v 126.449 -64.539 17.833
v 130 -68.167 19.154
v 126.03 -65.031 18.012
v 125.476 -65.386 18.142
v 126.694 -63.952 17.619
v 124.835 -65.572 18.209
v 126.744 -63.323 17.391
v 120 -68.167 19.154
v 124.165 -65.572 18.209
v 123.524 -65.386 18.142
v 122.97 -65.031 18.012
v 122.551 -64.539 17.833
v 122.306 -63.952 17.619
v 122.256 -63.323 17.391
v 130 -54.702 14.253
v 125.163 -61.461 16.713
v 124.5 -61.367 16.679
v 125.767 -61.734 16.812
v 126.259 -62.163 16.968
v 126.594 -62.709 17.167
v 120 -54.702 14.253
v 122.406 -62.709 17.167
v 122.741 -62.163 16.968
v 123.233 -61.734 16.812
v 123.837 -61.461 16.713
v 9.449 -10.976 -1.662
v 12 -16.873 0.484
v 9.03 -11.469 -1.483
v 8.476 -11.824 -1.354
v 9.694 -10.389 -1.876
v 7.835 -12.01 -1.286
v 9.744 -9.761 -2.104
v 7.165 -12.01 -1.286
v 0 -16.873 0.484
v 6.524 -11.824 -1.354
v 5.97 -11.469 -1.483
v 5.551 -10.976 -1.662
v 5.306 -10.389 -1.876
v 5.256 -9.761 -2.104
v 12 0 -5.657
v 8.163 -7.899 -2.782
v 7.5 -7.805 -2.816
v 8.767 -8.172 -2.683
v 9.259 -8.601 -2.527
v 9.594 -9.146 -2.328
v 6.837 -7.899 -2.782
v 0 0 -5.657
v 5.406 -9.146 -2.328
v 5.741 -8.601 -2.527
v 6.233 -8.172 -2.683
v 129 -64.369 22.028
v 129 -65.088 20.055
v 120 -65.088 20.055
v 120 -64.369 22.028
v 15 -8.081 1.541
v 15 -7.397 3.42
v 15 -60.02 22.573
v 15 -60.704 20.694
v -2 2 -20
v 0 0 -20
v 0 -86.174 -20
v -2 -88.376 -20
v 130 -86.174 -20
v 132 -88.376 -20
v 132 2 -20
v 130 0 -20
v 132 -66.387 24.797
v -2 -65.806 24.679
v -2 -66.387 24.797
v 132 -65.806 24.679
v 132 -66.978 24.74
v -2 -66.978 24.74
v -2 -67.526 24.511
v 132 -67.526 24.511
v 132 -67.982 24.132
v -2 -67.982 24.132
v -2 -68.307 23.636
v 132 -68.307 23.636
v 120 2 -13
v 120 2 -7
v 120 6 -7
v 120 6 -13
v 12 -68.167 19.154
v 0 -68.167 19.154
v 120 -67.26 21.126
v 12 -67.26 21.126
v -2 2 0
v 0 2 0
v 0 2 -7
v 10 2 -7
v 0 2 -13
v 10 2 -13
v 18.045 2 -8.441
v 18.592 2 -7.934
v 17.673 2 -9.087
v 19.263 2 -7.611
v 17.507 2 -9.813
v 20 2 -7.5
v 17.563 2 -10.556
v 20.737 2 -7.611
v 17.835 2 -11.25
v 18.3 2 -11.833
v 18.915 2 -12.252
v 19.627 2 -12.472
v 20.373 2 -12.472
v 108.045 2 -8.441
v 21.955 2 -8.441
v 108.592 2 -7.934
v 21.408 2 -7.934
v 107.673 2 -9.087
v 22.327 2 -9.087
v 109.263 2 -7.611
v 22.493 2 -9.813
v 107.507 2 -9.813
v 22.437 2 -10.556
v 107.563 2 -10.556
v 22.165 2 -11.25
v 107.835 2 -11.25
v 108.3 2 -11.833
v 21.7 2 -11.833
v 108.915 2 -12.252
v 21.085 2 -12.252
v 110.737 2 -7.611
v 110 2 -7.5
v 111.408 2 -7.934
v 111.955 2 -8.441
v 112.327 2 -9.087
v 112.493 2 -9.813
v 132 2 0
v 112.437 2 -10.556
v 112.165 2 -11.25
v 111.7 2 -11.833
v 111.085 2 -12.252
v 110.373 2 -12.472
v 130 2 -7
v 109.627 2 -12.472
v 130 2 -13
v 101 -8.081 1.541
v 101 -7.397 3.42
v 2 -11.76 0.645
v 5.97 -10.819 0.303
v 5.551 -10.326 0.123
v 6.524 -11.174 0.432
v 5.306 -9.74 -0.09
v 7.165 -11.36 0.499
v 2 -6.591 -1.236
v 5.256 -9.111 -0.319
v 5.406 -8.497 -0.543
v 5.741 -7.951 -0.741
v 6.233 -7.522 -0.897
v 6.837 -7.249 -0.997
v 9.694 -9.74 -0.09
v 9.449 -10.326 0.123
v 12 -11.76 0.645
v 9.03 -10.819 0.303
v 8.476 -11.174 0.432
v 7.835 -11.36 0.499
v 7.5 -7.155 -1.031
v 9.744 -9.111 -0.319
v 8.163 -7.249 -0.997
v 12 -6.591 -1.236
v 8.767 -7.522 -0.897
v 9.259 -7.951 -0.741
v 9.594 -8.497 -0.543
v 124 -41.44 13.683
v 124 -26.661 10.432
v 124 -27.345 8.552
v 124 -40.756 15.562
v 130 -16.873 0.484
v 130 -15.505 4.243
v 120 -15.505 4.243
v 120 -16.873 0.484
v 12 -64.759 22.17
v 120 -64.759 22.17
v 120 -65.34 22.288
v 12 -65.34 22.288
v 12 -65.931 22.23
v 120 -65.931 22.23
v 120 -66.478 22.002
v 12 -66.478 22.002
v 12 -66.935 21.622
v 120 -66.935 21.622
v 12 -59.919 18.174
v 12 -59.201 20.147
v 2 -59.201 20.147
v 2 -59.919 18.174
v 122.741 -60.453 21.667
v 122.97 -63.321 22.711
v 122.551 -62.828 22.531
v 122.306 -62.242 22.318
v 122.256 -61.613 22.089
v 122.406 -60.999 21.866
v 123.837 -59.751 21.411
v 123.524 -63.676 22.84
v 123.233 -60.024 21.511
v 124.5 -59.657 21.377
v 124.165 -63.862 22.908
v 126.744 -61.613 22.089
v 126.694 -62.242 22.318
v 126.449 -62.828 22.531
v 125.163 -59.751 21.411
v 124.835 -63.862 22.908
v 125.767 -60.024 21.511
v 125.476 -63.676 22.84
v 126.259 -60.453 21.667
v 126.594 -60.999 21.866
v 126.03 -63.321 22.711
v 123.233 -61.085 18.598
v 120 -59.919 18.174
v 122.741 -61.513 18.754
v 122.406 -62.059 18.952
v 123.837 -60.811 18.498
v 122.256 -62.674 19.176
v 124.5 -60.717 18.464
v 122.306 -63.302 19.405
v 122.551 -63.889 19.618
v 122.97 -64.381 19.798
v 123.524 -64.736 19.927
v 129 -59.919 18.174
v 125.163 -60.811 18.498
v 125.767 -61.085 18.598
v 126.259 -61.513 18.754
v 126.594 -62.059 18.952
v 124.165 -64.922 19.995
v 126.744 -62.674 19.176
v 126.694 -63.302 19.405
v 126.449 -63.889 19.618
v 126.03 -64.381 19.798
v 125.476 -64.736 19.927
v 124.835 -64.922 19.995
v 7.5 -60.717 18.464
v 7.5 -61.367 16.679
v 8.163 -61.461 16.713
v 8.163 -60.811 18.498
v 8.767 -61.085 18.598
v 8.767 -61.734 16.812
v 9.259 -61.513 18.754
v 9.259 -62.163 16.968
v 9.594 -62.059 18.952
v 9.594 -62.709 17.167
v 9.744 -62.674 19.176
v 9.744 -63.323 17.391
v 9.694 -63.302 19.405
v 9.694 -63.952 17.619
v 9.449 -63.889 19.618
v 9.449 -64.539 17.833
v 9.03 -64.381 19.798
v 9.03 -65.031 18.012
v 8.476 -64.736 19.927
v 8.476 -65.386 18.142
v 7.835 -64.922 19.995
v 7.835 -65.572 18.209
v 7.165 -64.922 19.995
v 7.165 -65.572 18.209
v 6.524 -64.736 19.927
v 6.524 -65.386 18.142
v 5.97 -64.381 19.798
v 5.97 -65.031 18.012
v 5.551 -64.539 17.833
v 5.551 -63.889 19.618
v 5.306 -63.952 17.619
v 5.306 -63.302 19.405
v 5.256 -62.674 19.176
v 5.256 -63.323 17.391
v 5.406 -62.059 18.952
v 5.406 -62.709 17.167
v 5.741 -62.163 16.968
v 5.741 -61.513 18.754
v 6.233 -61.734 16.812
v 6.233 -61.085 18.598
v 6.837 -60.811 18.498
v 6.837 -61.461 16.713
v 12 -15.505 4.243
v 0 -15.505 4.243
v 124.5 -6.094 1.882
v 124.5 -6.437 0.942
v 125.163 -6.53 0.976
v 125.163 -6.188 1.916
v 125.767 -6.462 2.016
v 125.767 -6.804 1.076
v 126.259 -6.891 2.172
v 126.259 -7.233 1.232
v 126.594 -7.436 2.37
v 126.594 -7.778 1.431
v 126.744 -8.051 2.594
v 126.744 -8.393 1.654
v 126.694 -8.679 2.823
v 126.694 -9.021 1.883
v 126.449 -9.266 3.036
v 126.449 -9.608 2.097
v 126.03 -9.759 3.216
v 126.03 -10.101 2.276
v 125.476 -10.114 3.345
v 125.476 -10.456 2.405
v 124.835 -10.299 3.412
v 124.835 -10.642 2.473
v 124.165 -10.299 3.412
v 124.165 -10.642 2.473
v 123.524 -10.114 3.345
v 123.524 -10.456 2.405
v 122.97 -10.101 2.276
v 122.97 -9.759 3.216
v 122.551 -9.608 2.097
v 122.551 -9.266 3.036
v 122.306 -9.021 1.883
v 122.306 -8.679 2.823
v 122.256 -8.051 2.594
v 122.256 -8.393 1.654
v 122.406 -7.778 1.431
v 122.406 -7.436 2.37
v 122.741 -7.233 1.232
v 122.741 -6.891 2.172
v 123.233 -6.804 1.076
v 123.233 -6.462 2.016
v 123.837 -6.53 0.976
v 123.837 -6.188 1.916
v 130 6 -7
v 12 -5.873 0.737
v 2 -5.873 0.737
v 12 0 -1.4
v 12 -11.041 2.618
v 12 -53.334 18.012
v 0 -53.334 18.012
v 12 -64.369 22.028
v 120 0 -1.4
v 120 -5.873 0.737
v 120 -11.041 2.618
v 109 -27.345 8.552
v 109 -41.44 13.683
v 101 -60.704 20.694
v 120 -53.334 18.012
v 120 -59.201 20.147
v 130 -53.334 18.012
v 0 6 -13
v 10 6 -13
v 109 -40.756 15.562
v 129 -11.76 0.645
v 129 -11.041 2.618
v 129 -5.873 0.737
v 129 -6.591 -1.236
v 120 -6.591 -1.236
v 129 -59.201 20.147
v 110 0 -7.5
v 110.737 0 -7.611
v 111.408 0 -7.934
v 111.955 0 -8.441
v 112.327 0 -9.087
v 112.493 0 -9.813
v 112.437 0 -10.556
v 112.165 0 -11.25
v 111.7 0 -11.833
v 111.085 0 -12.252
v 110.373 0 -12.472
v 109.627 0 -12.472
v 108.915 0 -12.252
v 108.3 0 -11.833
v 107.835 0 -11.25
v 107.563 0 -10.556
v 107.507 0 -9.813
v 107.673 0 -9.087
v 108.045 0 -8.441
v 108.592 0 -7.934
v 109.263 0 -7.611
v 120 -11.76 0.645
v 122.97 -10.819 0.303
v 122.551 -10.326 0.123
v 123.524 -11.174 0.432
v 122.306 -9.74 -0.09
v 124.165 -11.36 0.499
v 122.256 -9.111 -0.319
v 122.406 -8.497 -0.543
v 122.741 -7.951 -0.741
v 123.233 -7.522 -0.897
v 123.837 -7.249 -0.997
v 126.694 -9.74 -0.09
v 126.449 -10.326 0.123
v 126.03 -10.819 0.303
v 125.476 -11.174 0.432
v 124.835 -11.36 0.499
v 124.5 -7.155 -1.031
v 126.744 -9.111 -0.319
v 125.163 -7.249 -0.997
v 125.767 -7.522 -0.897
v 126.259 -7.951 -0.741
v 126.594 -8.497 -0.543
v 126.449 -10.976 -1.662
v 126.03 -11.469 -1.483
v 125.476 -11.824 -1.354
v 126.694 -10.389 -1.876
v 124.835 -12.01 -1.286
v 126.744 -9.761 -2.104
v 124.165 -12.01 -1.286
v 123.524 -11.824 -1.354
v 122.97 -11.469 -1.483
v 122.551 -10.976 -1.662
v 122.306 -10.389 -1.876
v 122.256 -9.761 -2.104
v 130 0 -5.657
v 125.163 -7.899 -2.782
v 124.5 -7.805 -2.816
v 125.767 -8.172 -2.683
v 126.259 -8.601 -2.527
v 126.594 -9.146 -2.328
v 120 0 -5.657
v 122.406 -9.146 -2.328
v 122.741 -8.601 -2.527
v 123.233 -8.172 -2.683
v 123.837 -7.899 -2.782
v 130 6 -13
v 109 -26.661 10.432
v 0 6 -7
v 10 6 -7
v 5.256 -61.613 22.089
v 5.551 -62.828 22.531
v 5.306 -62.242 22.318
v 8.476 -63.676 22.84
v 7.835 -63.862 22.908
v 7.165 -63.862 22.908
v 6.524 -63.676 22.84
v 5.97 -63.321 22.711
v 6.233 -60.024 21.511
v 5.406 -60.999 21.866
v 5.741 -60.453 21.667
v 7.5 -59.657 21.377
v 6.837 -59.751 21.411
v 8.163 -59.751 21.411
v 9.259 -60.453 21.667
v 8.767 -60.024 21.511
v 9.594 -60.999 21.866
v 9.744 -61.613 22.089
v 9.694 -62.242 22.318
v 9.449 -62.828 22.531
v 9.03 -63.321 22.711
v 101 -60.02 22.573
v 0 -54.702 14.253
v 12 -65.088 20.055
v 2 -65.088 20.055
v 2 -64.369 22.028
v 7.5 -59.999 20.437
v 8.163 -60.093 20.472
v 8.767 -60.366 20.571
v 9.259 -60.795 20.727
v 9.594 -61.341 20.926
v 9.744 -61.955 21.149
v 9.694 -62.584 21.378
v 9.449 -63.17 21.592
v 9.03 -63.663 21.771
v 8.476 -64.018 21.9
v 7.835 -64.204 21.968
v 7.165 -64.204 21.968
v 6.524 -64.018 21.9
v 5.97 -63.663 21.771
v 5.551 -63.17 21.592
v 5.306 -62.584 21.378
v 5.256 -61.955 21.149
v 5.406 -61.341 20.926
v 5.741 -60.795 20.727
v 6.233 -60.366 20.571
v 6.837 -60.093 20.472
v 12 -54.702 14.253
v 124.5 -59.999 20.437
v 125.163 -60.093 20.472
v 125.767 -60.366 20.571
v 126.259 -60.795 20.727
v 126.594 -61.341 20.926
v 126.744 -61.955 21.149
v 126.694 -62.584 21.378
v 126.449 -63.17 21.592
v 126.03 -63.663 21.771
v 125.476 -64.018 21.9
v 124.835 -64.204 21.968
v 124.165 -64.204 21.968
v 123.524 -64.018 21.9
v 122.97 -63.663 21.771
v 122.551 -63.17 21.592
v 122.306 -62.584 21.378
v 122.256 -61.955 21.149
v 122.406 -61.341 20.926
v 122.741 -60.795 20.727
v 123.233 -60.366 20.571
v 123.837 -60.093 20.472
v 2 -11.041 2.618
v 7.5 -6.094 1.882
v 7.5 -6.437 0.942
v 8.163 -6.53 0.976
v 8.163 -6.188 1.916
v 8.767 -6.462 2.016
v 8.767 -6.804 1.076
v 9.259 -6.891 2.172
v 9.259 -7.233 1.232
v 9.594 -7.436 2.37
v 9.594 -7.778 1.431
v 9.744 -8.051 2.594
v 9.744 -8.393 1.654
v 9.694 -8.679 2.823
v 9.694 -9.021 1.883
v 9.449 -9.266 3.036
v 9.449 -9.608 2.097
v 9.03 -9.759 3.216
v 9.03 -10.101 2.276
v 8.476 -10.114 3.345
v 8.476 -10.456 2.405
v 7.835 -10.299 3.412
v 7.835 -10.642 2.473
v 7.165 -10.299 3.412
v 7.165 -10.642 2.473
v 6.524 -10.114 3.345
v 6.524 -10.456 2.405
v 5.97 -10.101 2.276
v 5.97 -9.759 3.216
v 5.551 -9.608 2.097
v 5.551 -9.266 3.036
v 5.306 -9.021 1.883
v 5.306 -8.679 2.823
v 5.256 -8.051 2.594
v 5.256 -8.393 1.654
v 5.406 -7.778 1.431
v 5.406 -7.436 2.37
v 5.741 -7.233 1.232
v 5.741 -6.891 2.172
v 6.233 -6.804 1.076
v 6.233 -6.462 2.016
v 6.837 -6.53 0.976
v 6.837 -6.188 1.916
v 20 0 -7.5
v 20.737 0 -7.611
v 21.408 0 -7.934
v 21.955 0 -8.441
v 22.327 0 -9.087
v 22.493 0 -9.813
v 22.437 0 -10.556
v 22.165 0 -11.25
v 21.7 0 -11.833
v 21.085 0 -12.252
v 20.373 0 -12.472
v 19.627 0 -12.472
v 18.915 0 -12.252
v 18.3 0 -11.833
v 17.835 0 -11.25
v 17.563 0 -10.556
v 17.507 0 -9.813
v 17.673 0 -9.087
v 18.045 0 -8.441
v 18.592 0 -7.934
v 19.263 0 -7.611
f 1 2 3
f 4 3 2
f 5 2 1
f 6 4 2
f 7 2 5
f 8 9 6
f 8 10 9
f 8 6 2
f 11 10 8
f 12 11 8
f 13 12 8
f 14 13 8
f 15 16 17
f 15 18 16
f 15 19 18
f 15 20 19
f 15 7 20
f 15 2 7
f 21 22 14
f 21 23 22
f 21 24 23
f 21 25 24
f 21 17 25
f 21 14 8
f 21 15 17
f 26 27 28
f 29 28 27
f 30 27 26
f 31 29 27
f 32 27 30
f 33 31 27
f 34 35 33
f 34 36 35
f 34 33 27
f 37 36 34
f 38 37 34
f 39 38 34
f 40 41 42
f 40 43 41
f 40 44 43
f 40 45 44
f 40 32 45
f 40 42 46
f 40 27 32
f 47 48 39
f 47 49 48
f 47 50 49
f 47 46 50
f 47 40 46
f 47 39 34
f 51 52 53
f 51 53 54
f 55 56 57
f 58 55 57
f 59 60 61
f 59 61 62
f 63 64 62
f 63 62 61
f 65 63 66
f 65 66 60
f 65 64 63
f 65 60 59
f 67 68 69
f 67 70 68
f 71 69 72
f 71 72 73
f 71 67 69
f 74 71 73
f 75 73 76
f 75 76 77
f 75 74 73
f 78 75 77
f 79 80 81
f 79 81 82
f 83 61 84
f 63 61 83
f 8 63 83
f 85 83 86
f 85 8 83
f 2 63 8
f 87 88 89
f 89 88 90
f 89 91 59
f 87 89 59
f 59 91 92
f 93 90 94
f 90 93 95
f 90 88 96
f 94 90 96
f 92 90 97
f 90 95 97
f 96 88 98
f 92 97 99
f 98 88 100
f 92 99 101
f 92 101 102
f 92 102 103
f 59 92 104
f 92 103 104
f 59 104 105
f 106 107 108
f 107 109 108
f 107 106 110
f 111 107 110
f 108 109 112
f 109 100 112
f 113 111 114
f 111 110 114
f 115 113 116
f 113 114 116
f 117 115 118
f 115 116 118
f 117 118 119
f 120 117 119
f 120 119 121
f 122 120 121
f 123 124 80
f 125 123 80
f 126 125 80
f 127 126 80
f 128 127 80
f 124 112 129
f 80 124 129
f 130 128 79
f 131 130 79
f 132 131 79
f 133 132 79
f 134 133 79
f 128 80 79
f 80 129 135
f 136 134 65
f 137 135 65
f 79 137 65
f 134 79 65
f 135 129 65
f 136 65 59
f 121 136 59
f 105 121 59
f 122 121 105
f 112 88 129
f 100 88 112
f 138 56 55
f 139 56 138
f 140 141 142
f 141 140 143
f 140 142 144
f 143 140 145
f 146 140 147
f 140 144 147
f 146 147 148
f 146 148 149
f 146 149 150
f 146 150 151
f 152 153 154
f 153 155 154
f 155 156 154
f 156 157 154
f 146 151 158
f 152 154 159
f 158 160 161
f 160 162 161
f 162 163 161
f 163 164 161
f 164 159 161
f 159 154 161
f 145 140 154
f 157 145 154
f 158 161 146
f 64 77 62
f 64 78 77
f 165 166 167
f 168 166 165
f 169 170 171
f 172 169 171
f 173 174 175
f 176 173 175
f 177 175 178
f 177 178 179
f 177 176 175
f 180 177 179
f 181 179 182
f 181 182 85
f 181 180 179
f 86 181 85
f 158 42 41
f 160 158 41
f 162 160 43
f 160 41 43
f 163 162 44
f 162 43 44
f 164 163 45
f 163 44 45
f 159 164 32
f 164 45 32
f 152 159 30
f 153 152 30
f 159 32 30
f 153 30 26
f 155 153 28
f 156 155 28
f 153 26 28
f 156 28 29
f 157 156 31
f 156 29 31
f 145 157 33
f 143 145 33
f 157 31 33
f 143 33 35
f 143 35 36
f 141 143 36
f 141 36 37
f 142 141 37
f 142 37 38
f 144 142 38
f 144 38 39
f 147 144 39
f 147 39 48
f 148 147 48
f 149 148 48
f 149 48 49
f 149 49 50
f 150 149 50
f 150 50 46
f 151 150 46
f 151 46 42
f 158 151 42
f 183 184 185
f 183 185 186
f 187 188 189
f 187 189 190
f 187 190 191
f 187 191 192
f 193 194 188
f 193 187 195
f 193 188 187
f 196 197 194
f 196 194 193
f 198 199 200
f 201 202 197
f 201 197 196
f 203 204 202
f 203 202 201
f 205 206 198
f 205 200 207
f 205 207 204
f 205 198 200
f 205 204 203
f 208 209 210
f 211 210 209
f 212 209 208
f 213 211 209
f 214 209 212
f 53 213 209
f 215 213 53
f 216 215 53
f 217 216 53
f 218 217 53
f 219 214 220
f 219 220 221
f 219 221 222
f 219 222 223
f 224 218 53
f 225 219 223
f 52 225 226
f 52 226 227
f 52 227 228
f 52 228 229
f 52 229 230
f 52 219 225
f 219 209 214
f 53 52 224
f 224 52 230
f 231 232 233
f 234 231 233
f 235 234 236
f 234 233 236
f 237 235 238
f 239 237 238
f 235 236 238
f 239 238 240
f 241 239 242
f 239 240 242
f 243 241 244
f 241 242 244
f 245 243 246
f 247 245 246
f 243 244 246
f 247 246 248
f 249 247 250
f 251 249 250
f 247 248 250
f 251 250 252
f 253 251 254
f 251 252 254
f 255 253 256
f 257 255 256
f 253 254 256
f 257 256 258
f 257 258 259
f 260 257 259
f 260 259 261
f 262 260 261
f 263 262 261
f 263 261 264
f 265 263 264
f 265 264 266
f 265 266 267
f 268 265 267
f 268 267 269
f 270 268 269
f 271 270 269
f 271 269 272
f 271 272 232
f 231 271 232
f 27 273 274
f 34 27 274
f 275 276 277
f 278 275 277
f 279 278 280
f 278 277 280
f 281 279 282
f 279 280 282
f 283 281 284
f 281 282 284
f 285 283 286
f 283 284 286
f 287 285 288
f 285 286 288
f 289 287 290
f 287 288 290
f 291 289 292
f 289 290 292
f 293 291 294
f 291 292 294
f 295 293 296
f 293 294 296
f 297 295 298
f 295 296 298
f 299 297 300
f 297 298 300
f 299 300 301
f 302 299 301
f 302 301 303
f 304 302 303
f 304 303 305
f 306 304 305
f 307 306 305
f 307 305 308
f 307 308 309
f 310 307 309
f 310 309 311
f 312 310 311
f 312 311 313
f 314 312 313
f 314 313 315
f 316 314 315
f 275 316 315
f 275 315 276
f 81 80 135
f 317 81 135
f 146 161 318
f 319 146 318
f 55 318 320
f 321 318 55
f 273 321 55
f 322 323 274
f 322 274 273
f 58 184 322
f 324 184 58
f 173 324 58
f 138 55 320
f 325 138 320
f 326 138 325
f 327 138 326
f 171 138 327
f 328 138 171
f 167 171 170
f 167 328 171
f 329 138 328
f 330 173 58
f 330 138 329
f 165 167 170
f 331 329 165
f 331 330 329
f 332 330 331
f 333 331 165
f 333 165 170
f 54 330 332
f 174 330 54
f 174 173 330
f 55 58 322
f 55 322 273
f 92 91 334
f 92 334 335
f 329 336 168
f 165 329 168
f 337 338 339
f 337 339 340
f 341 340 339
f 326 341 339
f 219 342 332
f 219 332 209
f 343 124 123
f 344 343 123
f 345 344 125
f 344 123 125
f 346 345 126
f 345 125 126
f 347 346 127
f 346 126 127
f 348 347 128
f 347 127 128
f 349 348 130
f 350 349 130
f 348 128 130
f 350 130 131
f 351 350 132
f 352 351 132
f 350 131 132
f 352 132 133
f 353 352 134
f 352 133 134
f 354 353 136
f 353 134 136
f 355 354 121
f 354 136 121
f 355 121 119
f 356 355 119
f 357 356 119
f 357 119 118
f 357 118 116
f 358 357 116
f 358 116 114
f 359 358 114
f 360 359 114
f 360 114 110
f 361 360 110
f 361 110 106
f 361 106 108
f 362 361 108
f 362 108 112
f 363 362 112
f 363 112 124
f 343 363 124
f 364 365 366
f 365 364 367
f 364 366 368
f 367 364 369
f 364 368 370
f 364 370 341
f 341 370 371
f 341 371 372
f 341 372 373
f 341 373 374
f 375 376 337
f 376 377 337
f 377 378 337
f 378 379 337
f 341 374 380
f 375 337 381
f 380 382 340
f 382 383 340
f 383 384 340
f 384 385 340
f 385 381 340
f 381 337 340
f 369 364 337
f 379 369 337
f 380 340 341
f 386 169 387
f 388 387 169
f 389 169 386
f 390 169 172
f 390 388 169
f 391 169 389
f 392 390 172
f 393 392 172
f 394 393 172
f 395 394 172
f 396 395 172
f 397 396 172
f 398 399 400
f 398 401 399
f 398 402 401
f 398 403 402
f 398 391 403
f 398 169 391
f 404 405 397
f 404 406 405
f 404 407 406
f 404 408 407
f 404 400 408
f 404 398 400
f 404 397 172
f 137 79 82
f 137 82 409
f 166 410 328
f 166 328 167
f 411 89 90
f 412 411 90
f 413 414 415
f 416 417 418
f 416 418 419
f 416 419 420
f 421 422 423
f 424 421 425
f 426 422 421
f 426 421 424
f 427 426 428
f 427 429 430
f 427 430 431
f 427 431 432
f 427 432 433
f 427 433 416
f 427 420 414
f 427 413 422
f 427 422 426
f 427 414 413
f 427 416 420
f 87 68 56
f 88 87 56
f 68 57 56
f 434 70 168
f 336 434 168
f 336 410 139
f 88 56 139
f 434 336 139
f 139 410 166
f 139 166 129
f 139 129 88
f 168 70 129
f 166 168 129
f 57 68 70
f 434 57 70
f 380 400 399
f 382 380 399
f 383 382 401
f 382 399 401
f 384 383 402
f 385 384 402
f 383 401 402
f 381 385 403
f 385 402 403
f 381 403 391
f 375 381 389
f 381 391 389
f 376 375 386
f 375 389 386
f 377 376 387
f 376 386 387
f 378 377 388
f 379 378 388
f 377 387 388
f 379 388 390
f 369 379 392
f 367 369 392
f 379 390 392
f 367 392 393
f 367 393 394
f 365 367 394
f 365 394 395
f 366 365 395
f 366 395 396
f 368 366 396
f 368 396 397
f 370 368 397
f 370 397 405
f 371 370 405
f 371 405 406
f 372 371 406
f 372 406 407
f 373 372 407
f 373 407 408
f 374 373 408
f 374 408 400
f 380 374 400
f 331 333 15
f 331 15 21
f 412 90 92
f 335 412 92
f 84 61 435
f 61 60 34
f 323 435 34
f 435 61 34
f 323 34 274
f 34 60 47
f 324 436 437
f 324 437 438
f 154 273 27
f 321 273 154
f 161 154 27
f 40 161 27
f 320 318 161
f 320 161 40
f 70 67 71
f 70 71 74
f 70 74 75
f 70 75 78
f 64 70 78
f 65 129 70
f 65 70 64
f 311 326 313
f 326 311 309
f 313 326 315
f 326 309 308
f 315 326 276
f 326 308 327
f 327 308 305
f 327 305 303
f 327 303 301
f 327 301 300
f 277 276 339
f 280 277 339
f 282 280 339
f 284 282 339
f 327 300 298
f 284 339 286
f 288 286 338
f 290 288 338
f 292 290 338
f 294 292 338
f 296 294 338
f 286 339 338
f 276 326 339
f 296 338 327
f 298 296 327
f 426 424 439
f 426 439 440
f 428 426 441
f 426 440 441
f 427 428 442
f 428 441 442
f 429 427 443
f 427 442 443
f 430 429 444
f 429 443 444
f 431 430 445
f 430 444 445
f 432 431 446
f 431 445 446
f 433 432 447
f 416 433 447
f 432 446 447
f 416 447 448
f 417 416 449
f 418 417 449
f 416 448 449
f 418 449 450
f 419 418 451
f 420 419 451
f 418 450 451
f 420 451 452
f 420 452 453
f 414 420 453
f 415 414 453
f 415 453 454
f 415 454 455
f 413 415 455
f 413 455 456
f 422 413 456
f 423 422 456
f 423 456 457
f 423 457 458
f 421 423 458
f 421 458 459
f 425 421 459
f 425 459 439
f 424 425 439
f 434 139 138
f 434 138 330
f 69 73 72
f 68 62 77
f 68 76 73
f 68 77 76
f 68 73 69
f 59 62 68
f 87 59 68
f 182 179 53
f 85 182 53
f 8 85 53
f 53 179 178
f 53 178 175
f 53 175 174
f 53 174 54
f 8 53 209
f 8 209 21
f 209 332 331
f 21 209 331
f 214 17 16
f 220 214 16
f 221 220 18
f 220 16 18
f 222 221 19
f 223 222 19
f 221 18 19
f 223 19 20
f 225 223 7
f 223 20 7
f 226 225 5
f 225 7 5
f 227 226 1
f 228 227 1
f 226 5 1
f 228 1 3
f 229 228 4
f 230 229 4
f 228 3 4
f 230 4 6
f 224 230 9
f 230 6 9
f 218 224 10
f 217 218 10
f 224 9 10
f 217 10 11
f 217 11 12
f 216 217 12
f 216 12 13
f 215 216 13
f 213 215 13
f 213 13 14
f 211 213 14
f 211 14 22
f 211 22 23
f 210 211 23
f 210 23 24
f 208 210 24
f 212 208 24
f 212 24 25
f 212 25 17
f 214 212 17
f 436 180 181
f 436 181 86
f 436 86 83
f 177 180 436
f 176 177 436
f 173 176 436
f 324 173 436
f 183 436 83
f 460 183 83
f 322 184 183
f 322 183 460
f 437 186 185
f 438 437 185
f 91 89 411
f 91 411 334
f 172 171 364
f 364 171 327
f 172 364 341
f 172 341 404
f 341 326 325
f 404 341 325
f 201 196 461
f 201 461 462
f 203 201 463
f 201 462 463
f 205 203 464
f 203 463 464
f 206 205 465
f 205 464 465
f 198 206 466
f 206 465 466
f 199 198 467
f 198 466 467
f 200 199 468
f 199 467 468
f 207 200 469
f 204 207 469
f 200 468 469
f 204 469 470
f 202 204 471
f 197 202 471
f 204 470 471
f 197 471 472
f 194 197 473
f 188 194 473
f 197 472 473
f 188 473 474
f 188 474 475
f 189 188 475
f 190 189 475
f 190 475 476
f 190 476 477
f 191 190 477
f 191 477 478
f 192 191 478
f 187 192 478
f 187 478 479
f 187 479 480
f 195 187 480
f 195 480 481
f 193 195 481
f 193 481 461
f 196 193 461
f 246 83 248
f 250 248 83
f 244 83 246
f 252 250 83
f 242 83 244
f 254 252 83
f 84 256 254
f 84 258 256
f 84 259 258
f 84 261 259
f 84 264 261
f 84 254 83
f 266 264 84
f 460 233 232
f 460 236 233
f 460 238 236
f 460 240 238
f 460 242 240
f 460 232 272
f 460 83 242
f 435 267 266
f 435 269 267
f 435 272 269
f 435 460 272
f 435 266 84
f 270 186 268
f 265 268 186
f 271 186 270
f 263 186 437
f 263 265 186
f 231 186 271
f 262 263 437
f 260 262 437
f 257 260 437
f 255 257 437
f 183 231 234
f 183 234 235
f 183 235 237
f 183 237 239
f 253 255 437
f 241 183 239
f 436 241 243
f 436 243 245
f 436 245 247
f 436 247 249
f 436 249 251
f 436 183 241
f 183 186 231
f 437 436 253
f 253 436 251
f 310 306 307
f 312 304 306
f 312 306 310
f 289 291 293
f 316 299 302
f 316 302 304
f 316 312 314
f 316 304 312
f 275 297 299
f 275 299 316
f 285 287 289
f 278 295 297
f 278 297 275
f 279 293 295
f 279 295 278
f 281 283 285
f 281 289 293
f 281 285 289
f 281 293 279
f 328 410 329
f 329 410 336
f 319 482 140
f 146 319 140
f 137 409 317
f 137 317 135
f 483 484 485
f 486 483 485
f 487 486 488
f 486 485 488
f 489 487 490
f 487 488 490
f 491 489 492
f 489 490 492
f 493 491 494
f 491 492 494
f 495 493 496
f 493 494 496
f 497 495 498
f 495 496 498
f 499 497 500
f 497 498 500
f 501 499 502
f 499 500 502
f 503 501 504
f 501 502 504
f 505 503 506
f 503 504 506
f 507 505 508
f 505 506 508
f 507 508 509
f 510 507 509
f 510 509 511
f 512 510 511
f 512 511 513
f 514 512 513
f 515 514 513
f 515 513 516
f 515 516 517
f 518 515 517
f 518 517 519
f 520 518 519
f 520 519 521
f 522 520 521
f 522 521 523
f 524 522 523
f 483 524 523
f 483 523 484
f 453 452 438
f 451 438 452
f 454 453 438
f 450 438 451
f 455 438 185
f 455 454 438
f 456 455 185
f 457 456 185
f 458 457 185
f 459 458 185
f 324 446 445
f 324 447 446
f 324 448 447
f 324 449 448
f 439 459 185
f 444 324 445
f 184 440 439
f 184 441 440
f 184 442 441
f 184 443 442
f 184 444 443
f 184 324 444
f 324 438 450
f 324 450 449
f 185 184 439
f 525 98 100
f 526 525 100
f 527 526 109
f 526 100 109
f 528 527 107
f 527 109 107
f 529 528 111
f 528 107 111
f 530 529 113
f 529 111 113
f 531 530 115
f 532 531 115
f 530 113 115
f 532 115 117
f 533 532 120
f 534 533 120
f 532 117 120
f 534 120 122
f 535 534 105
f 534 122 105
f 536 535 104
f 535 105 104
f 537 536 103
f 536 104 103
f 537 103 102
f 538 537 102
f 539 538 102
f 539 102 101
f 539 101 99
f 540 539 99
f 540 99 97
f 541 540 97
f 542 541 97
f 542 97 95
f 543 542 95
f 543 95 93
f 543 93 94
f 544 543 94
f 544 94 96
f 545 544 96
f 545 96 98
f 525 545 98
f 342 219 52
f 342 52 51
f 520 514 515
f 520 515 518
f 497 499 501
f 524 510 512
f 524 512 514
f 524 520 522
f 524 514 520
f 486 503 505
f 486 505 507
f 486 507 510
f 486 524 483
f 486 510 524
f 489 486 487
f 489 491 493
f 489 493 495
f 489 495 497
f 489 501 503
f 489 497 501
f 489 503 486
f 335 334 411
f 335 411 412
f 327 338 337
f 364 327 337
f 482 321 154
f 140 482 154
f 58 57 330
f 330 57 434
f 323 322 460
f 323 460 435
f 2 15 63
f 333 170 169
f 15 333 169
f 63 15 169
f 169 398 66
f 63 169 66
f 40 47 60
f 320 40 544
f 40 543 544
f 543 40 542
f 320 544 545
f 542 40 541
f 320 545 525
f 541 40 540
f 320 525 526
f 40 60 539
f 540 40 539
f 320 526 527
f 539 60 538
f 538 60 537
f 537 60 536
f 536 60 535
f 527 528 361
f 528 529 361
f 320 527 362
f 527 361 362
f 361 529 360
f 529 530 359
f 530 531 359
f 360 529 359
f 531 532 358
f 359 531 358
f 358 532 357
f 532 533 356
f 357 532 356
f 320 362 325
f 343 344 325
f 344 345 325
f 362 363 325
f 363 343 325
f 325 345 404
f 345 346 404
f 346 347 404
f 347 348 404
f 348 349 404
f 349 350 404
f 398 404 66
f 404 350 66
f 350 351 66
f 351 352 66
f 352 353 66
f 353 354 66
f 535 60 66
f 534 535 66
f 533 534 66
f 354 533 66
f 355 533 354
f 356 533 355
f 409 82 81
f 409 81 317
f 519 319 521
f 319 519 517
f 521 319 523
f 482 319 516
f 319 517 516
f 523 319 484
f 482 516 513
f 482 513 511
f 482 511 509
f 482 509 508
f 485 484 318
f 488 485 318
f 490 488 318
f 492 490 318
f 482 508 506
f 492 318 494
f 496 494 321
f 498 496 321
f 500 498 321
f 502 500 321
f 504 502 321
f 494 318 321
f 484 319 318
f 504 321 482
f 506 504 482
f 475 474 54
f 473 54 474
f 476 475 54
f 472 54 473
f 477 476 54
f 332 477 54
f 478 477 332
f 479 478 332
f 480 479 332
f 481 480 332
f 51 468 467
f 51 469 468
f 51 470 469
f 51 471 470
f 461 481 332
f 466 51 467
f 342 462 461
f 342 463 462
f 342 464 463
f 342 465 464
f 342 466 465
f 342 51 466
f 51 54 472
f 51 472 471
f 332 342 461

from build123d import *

# Parameters (mm, degrees)
SKETCH_1_W               = 130
SKETCH_1_H               = 20
EXTRUDE_1_DEPTH          = 2
SKETCH_2_W               = 10
SKETCH_2_H               = 6
EXTRUDE_2_DEPTH          = 4
SKETCH_3_R               = 2.5
CUT_EXTRUDE_1_DEPTH      = 4
SKETCH_4_W               = 130
SKETCH_4_H               = 74
SKETCH_4_W_2             = 86
SKETCH_4_H_2             = 56
SKETCH_4_W_3             = 15
SKETCH_4_H_3             = 15
EXTRUDE_3_DEPTH          = 2
EXTRUDE_4_DEPTH          = 2
EXTRUDE_5_DEPTH          = 2
EXTRUDE_6_DEPTH          = 130
SKETCH_9_W               = 10
SKETCH_9_H               = 18
SKETCH_9_W_2             = 12
SKETCH_9_H_2             = 15
EXTRUDE_7_DEPTH          = 4
SKETCH_10_R              = 2.25
CUT_EXTRUDE_2_DEPTH      = 5
CUT_EXTRUDE_3_DEPTH      = 118
CUT_EXTRUDE_3_DEPTH_BACK = 9
FILLET_1_R               = 2
FILLET_2_R               = 2


with BuildPart() as part:
    # Эскиз1 → Бобышка-Вытянуть1 (new body)
    with BuildSketch(Plane(origin=(0, 0, 0), x_dir=(1, 0, 0), z_dir=(0, 1, 0))):
        with Locations((65, 10)):
            Rectangle(SKETCH_1_W, SKETCH_1_H)
    extrude(amount=EXTRUDE_1_DEPTH)

    # Эскиз2 → Бобышка-Вытянуть2 (add)
    with BuildSketch(Plane(origin=(0, 2, 0), x_dir=(1, 0, 0), z_dir=(0, 1, 0))):
        with Locations((5, 10)):
            Rectangle(SKETCH_2_W, SKETCH_2_H)
        with Locations((125, 10)):
            Rectangle(SKETCH_2_W, SKETCH_2_H)
    extrude(amount=EXTRUDE_2_DEPTH)

    # Эскиз3 → Вырез-Вытянуть1 (cut)
    with BuildSketch(Plane(origin=(0, 2, 0), x_dir=(1, 0, 0), z_dir=(0, 1, 0))):
        with Locations(Location((20, 10, 0), (0, 0, 270))):
            Circle(SKETCH_3_R)
        with Locations(Location((110, 10, 0), (0, 0, 270))):
            Circle(SKETCH_3_R)
    extrude(amount=-CUT_EXTRUDE_1_DEPTH, mode=Mode.SUBTRACT)

    # Эскиз4 → Бобышка-Вытянуть3 (add)
    with BuildSketch(Plane(origin=(0, 0.233955557, 0.64278761), x_dir=(1, 0, 0), z_dir=(0, -0.3420201433256631, -0.9396926207859105))):
        with Locations((65, 35.120614758)):
            Rectangle(SKETCH_4_W, SKETCH_4_H)
        with Locations((58, 36.120614758)):
            Rectangle(SKETCH_4_W_2, SKETCH_4_H_2, mode=Mode.SUBTRACT)
        with Locations((116.5, 36.120614758)):
            Rectangle(SKETCH_4_W_3, SKETCH_4_H_3, mode=Mode.SUBTRACT)
    extrude(amount=EXTRUDE_3_DEPTH)

    # Эскиз5 → Бобышка-Вытянуть4 (add)
    with BuildSketch(Plane(origin=(130, 0, 0), x_dir=(0, 0, -1), z_dir=(1, 0, 0))):
        Polygon((0, 2), (-25.309490606, -67.537253938), (20, -88.375754865), (20, 2), align=None)
    extrude(amount=EXTRUDE_4_DEPTH)

    # Эскиз7 → Бобышка-Вытянуть5 (add)
    with BuildSketch(Plane.ZY):
        Polygon((-20, 2), (-20, -88.375754865), (25.309490606, -67.537253938), (0, 2), align=None)
    extrude(amount=EXTRUDE_5_DEPTH)

    # Эскиз8 → Бобышка-Вытянуть6 (add)
    with BuildSketch(Plane.ZY.offset(-130)):
        Polygon((-20, -86.174372086), (22.799977809, -66.490032993), (25.309490606, -67.537253938), (-20, -88.375754865), align=None)
    extrude(amount=EXTRUDE_6_DEPTH)

    # Эскиз9 → Бобышка-Вытянуть7 (add)
    with BuildSketch(Plane(origin=(0, -0.45008473, -1.236597632), x_dir=(-1, 0, 0), z_dir=(0, -0.34202014332566316, -0.9396926207859104))):
        with Locations((-125, -7.021029835)):
            Rectangle(SKETCH_9_W, SKETCH_9_H)
        with Locations((-6, -7.021029835)):
            Rectangle(SKETCH_9_W_2, SKETCH_9_H)
        with Locations((-6, -63.778245038)):
            Rectangle(SKETCH_9_W_2, SKETCH_9_H_2)
        with Locations((-125, -63.778245038)):
            Rectangle(SKETCH_9_W, SKETCH_9_H_2)
    extrude(amount=EXTRUDE_7_DEPTH)

    # Эскиз10 → Вырез-Вытянуть2 (cut)
    with BuildSketch(Plane(origin=(0, -1.818165303, -4.995368115), x_dir=(-1, 0, 0), z_dir=(0, -0.3420201433256632, -0.9396926207859104))):
        with Locations(Location((-124.5, -8.620614758, 0), (0, 0, 90))):
            Circle(SKETCH_10_R)
        with Locations(Location((-7.5, -65.620614758, 0), (0, 0, 90))):
            Circle(SKETCH_10_R)
        with Locations(Location((-124.5, -65.620614758, 0), (0, 0, 90))):
            Circle(SKETCH_10_R)
        with Locations(Location((-7.5, -8.620614758, 0), (0, 0, 90))):
            Circle(SKETCH_10_R)
    extrude(amount=-CUT_EXTRUDE_2_DEPTH, mode=Mode.SUBTRACT)

    # Эскиз11 → Вырез-Вытянуть3 (cut, two sides: drawn at the far end of the back side and taken through both)
    with BuildSketch(Plane.ZY.offset(-120).offset(-CUT_EXTRUDE_3_DEPTH_BACK)):
        Polygon((0.737210819, -5.87307888), (2.618321608, -11.041388294), (0.644967104, -11.759630595), (-1.236143684, -6.591321181), align=None)
        Polygon((20.14698757, -59.201002218), (18.173633066, -59.919244519), (20.054743854, -65.087553933), (22.028098358, -64.369311632), align=None)
    extrude(amount=CUT_EXTRUDE_3_DEPTH + CUT_EXTRUDE_3_DEPTH_BACK, mode=Mode.SUBTRACT)

    # Скругление1
    fillet_1_edges = [part.edges().sort_by_distance(p)[0] for p in [
        (66, -66.490032993, 22.799977809),
    ]]
    fillet(fillet_1_edges, radius=FILLET_1_R)

    # Скругление2
    fillet_2_edges = [part.edges().sort_by_distance(p)[0] for p in [
        (65, -67.537253938, 25.309490606),
    ]]
    fillet(fillet_2_edges, radius=FILLET_2_R)


solid = part.part
